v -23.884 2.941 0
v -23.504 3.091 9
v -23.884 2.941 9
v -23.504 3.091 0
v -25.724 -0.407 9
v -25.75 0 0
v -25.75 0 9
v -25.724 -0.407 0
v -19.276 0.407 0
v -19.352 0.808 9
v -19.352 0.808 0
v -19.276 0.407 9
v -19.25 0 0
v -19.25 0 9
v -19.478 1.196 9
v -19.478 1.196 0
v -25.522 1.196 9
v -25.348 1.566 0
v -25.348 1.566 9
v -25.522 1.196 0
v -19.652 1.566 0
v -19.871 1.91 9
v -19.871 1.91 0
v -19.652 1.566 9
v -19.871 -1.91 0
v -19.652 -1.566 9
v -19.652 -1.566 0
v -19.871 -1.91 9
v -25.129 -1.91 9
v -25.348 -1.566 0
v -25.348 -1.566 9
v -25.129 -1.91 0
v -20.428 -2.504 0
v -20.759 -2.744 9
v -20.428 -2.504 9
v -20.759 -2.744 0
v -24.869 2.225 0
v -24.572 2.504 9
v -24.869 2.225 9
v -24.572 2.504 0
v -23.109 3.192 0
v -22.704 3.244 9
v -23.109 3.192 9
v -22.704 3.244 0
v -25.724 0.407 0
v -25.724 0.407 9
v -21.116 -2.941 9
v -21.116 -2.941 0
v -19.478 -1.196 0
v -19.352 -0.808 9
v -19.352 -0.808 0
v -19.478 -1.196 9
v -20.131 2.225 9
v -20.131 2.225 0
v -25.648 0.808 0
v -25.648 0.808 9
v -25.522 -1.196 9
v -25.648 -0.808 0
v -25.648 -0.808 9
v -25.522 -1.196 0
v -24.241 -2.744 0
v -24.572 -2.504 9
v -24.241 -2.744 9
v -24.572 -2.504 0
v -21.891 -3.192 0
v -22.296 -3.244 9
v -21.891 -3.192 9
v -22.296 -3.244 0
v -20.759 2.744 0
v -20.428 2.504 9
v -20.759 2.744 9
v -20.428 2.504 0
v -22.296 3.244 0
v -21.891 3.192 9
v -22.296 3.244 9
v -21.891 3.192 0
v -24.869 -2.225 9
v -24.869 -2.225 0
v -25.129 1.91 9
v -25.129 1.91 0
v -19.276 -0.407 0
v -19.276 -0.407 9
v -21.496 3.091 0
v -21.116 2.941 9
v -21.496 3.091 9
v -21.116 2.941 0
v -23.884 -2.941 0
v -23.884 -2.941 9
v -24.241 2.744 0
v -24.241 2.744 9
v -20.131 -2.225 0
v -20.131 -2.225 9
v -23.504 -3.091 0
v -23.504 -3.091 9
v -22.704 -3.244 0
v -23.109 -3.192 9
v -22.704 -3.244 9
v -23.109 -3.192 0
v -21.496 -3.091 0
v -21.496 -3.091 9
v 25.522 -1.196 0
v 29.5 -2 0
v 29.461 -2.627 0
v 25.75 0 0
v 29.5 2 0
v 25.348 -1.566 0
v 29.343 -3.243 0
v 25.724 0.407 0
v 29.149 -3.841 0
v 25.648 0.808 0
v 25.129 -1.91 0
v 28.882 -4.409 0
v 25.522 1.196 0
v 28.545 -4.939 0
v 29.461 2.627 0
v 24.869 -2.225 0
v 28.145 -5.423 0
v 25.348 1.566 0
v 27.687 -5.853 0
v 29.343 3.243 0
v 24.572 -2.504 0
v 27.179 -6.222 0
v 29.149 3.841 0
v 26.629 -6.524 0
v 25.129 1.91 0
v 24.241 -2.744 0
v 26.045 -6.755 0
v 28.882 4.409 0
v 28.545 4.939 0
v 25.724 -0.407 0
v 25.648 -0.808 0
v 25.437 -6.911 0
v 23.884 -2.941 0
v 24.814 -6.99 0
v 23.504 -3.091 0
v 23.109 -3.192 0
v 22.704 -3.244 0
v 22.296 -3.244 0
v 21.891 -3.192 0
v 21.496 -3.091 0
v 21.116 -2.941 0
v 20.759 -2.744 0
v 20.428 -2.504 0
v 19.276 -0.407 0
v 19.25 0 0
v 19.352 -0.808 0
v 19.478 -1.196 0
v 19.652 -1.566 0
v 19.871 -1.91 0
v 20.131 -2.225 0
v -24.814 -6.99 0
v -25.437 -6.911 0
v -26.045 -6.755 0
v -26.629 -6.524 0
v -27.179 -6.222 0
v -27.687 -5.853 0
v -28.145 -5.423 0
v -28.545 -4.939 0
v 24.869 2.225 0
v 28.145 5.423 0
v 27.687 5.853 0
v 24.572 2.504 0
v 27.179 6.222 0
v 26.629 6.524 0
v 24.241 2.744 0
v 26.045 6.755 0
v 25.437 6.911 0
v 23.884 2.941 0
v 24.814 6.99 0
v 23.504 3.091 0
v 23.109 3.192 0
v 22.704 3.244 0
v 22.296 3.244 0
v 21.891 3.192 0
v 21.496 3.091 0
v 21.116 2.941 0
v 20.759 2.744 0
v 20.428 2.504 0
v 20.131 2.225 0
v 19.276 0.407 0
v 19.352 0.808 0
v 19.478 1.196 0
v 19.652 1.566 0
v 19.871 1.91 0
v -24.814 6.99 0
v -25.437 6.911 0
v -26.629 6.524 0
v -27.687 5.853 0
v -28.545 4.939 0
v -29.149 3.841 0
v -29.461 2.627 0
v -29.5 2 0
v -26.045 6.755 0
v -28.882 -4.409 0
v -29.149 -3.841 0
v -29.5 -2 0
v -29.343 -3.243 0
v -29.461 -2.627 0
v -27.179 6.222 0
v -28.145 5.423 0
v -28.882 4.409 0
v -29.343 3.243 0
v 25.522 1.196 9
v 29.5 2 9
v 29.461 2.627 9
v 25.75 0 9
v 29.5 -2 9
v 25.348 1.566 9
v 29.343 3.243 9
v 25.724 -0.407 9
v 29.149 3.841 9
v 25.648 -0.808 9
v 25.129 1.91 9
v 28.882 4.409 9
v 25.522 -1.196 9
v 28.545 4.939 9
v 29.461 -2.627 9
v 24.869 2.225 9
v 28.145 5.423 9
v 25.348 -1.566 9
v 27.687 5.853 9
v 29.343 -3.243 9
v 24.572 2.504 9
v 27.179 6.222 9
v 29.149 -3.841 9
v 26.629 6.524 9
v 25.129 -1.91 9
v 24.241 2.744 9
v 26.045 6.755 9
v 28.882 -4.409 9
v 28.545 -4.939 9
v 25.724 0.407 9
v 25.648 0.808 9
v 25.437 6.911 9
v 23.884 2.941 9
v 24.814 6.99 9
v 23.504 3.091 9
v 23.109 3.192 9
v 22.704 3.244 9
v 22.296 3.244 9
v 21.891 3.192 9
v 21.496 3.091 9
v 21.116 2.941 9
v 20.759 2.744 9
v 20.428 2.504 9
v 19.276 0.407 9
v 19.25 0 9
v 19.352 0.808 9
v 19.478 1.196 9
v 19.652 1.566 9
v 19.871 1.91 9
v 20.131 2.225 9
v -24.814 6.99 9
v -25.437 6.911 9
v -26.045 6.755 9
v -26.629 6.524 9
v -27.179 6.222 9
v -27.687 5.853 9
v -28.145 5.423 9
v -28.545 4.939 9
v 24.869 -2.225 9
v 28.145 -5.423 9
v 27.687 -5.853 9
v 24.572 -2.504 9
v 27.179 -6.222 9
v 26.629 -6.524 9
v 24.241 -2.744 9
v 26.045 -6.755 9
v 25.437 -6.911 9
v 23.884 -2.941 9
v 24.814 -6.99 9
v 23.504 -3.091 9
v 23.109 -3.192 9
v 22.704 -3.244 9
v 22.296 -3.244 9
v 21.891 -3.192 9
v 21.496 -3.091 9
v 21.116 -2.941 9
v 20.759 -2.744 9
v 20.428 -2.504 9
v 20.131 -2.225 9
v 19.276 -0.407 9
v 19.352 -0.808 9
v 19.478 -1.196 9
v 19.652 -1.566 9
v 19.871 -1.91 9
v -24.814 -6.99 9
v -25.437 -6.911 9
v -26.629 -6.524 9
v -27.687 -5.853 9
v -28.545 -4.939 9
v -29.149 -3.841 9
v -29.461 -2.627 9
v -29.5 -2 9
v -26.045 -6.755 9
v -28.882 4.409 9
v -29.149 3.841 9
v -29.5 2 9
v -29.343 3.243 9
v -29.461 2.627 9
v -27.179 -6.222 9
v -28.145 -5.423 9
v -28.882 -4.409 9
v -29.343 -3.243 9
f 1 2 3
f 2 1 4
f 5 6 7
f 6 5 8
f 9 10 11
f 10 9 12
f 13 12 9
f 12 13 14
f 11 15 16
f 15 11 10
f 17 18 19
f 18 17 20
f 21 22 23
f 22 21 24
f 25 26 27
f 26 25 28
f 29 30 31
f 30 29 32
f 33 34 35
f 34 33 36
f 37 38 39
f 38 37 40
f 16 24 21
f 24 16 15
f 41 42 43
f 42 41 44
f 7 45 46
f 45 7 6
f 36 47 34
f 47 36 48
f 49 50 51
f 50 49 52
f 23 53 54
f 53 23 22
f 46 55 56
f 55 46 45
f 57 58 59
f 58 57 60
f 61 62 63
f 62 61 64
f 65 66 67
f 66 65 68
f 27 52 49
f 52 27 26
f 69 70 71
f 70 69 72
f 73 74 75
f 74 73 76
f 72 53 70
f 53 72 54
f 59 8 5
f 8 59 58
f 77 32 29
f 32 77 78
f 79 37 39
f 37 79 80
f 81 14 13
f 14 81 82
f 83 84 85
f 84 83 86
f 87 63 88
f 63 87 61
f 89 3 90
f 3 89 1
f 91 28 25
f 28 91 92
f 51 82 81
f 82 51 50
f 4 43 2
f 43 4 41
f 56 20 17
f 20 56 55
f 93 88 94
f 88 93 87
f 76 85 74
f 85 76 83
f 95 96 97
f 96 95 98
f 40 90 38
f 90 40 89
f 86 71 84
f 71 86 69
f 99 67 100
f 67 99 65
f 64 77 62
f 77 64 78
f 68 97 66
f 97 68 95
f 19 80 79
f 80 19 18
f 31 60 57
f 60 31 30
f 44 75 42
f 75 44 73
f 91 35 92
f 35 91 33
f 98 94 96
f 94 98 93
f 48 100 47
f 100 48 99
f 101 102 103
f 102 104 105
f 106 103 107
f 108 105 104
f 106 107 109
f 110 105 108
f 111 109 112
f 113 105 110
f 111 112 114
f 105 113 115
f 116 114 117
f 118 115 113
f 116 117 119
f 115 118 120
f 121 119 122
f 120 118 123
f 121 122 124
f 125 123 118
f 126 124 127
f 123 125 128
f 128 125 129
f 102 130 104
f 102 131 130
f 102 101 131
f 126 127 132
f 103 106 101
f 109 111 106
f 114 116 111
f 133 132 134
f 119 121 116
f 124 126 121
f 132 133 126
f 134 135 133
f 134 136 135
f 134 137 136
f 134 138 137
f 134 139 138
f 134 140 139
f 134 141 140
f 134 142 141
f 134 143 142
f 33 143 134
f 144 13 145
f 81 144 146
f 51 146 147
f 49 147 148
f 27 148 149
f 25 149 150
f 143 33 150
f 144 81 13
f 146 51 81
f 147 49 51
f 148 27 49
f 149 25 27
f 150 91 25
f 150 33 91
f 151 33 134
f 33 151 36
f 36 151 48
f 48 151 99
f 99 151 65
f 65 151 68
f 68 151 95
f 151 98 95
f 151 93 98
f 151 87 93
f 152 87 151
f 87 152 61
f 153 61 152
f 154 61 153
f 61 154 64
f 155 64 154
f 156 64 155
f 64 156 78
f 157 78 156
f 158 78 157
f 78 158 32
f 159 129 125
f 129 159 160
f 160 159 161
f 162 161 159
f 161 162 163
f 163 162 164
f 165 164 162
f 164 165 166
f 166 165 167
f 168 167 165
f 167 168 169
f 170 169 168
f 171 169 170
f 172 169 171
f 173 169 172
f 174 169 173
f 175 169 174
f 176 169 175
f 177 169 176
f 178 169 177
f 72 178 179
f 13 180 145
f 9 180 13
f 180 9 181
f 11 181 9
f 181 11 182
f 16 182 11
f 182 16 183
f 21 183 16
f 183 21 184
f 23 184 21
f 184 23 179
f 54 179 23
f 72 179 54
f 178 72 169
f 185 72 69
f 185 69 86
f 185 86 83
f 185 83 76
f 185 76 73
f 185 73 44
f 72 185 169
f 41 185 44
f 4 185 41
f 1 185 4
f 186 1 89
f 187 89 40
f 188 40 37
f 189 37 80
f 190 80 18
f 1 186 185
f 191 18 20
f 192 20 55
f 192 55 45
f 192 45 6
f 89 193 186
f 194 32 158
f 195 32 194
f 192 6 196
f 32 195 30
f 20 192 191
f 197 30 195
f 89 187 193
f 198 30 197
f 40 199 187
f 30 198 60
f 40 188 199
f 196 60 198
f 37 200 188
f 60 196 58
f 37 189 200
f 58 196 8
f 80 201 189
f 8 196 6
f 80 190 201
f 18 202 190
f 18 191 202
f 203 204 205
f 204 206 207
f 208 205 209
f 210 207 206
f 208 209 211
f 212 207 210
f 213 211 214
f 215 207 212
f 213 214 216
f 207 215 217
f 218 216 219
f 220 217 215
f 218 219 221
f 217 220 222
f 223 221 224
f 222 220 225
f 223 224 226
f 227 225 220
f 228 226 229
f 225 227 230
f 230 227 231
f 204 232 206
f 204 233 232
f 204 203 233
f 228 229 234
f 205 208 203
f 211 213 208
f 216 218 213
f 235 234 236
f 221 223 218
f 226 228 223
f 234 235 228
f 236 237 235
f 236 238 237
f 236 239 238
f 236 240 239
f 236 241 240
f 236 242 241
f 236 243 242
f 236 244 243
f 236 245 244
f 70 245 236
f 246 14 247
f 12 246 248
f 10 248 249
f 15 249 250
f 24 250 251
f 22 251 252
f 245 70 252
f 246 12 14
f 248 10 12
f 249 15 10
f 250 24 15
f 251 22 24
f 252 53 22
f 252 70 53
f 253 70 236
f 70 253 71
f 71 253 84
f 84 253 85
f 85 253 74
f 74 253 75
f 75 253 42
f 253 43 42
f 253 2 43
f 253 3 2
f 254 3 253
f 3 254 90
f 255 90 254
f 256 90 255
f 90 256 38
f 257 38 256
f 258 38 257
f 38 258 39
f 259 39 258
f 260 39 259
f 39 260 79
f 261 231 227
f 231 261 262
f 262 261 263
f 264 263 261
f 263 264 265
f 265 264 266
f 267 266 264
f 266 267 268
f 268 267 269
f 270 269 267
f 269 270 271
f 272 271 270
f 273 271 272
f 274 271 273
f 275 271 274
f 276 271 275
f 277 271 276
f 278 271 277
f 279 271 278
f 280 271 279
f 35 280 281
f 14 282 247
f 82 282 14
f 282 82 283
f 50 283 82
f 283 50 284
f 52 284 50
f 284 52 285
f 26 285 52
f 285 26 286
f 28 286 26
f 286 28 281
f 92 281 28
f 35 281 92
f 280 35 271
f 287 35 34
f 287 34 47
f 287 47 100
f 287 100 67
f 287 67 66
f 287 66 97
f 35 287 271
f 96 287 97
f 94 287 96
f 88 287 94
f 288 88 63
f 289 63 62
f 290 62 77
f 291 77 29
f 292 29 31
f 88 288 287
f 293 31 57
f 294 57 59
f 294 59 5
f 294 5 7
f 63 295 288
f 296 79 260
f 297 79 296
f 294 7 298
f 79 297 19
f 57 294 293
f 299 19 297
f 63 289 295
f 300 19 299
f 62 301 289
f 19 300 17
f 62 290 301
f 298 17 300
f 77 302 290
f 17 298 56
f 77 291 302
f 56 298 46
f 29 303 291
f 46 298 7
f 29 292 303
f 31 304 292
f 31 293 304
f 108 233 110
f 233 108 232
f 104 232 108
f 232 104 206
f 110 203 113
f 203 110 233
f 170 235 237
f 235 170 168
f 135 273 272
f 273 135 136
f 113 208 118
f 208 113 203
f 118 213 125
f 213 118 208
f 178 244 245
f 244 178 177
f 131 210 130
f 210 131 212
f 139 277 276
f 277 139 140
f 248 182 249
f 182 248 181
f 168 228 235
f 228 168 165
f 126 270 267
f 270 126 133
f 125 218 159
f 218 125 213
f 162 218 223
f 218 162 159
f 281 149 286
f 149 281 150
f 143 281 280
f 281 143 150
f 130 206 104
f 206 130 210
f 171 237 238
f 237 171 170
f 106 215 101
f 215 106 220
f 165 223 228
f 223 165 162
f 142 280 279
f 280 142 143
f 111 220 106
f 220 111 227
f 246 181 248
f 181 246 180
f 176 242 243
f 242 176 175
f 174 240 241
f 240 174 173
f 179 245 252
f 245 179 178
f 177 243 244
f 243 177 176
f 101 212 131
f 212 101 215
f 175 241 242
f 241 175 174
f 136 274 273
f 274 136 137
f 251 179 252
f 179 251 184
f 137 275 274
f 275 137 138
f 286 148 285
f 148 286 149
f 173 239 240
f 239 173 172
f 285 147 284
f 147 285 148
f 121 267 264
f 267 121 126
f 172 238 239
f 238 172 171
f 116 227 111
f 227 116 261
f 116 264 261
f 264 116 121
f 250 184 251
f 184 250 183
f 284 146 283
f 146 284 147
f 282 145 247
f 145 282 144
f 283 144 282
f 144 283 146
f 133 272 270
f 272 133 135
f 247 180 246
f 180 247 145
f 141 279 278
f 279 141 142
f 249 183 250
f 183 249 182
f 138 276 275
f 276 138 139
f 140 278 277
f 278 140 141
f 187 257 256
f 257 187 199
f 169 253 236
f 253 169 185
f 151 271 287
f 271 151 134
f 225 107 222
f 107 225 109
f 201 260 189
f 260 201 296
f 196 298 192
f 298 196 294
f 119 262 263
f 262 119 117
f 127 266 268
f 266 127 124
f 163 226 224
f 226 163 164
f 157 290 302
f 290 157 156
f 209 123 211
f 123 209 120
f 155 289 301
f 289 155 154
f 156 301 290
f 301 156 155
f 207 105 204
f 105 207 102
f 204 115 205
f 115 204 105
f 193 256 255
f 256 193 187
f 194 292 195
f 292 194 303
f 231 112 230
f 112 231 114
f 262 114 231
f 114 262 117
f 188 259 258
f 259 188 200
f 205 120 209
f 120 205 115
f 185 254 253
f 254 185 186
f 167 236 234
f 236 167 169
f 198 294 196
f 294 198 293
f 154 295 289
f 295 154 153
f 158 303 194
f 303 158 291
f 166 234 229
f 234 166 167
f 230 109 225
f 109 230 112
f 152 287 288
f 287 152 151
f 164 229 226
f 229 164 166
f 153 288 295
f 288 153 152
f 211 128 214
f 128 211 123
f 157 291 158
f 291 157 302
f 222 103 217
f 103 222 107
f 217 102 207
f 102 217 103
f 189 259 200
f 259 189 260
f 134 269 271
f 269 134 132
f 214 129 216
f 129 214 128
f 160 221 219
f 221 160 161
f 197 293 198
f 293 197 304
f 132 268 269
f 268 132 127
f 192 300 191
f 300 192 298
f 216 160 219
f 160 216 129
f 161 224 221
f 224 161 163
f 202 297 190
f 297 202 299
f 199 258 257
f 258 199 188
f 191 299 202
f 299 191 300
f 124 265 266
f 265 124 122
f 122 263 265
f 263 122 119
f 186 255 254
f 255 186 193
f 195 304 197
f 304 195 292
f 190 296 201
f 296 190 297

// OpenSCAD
$fn = 50;


difference() {
	union() {
		hull() {
			translate(v = [-24.5000000000, 2.0000000000, 0]) {
				cylinder(h = 9, r = 5);
			}
			translate(v = [24.5000000000, 2.0000000000, 0]) {
				cylinder(h = 9, r = 5);
			}
			translate(v = [-24.5000000000, -2.0000000000, 0]) {
				cylinder(h = 9, r = 5);
			}
			translate(v = [24.5000000000, -2.0000000000, 0]) {
				cylinder(h = 9, r = 5);
			}
		}
	}
	union() {
		translate(v = [-22.5000000000, 0.0000000000, 0]) {
			cylinder(h = 9, r = 3.2500000000);
		}
		translate(v = [22.5000000000, 0.0000000000, 0]) {
			cylinder(h = 9, r = 3.2500000000);
		}
		translate(v = [-22.5000000000, 0.0000000000, 0]) {
			cylinder(h = 9, r = 1.8000000000);
		}
		translate(v = [22.5000000000, 0.0000000000, 0]) {
			cylinder(h = 9, r = 1.8000000000);
		}
		translate(v = [-22.5000000000, 0.0000000000, 0]) {
			cylinder(h = 9, r = 1.8000000000);
		}
		translate(v = [22.5000000000, 0.0000000000, 0]) {
			cylinder(h = 9, r = 1.8000000000);
		}
		translate(v = [-22.5000000000, 0.0000000000, 0]) {
			cylinder(h = 9, r = 1.8000000000);
		}
		translate(v = [22.5000000000, 0.0000000000, 0]) {
			cylinder(h = 9, r = 1.8000000000);
		}
	}
}
